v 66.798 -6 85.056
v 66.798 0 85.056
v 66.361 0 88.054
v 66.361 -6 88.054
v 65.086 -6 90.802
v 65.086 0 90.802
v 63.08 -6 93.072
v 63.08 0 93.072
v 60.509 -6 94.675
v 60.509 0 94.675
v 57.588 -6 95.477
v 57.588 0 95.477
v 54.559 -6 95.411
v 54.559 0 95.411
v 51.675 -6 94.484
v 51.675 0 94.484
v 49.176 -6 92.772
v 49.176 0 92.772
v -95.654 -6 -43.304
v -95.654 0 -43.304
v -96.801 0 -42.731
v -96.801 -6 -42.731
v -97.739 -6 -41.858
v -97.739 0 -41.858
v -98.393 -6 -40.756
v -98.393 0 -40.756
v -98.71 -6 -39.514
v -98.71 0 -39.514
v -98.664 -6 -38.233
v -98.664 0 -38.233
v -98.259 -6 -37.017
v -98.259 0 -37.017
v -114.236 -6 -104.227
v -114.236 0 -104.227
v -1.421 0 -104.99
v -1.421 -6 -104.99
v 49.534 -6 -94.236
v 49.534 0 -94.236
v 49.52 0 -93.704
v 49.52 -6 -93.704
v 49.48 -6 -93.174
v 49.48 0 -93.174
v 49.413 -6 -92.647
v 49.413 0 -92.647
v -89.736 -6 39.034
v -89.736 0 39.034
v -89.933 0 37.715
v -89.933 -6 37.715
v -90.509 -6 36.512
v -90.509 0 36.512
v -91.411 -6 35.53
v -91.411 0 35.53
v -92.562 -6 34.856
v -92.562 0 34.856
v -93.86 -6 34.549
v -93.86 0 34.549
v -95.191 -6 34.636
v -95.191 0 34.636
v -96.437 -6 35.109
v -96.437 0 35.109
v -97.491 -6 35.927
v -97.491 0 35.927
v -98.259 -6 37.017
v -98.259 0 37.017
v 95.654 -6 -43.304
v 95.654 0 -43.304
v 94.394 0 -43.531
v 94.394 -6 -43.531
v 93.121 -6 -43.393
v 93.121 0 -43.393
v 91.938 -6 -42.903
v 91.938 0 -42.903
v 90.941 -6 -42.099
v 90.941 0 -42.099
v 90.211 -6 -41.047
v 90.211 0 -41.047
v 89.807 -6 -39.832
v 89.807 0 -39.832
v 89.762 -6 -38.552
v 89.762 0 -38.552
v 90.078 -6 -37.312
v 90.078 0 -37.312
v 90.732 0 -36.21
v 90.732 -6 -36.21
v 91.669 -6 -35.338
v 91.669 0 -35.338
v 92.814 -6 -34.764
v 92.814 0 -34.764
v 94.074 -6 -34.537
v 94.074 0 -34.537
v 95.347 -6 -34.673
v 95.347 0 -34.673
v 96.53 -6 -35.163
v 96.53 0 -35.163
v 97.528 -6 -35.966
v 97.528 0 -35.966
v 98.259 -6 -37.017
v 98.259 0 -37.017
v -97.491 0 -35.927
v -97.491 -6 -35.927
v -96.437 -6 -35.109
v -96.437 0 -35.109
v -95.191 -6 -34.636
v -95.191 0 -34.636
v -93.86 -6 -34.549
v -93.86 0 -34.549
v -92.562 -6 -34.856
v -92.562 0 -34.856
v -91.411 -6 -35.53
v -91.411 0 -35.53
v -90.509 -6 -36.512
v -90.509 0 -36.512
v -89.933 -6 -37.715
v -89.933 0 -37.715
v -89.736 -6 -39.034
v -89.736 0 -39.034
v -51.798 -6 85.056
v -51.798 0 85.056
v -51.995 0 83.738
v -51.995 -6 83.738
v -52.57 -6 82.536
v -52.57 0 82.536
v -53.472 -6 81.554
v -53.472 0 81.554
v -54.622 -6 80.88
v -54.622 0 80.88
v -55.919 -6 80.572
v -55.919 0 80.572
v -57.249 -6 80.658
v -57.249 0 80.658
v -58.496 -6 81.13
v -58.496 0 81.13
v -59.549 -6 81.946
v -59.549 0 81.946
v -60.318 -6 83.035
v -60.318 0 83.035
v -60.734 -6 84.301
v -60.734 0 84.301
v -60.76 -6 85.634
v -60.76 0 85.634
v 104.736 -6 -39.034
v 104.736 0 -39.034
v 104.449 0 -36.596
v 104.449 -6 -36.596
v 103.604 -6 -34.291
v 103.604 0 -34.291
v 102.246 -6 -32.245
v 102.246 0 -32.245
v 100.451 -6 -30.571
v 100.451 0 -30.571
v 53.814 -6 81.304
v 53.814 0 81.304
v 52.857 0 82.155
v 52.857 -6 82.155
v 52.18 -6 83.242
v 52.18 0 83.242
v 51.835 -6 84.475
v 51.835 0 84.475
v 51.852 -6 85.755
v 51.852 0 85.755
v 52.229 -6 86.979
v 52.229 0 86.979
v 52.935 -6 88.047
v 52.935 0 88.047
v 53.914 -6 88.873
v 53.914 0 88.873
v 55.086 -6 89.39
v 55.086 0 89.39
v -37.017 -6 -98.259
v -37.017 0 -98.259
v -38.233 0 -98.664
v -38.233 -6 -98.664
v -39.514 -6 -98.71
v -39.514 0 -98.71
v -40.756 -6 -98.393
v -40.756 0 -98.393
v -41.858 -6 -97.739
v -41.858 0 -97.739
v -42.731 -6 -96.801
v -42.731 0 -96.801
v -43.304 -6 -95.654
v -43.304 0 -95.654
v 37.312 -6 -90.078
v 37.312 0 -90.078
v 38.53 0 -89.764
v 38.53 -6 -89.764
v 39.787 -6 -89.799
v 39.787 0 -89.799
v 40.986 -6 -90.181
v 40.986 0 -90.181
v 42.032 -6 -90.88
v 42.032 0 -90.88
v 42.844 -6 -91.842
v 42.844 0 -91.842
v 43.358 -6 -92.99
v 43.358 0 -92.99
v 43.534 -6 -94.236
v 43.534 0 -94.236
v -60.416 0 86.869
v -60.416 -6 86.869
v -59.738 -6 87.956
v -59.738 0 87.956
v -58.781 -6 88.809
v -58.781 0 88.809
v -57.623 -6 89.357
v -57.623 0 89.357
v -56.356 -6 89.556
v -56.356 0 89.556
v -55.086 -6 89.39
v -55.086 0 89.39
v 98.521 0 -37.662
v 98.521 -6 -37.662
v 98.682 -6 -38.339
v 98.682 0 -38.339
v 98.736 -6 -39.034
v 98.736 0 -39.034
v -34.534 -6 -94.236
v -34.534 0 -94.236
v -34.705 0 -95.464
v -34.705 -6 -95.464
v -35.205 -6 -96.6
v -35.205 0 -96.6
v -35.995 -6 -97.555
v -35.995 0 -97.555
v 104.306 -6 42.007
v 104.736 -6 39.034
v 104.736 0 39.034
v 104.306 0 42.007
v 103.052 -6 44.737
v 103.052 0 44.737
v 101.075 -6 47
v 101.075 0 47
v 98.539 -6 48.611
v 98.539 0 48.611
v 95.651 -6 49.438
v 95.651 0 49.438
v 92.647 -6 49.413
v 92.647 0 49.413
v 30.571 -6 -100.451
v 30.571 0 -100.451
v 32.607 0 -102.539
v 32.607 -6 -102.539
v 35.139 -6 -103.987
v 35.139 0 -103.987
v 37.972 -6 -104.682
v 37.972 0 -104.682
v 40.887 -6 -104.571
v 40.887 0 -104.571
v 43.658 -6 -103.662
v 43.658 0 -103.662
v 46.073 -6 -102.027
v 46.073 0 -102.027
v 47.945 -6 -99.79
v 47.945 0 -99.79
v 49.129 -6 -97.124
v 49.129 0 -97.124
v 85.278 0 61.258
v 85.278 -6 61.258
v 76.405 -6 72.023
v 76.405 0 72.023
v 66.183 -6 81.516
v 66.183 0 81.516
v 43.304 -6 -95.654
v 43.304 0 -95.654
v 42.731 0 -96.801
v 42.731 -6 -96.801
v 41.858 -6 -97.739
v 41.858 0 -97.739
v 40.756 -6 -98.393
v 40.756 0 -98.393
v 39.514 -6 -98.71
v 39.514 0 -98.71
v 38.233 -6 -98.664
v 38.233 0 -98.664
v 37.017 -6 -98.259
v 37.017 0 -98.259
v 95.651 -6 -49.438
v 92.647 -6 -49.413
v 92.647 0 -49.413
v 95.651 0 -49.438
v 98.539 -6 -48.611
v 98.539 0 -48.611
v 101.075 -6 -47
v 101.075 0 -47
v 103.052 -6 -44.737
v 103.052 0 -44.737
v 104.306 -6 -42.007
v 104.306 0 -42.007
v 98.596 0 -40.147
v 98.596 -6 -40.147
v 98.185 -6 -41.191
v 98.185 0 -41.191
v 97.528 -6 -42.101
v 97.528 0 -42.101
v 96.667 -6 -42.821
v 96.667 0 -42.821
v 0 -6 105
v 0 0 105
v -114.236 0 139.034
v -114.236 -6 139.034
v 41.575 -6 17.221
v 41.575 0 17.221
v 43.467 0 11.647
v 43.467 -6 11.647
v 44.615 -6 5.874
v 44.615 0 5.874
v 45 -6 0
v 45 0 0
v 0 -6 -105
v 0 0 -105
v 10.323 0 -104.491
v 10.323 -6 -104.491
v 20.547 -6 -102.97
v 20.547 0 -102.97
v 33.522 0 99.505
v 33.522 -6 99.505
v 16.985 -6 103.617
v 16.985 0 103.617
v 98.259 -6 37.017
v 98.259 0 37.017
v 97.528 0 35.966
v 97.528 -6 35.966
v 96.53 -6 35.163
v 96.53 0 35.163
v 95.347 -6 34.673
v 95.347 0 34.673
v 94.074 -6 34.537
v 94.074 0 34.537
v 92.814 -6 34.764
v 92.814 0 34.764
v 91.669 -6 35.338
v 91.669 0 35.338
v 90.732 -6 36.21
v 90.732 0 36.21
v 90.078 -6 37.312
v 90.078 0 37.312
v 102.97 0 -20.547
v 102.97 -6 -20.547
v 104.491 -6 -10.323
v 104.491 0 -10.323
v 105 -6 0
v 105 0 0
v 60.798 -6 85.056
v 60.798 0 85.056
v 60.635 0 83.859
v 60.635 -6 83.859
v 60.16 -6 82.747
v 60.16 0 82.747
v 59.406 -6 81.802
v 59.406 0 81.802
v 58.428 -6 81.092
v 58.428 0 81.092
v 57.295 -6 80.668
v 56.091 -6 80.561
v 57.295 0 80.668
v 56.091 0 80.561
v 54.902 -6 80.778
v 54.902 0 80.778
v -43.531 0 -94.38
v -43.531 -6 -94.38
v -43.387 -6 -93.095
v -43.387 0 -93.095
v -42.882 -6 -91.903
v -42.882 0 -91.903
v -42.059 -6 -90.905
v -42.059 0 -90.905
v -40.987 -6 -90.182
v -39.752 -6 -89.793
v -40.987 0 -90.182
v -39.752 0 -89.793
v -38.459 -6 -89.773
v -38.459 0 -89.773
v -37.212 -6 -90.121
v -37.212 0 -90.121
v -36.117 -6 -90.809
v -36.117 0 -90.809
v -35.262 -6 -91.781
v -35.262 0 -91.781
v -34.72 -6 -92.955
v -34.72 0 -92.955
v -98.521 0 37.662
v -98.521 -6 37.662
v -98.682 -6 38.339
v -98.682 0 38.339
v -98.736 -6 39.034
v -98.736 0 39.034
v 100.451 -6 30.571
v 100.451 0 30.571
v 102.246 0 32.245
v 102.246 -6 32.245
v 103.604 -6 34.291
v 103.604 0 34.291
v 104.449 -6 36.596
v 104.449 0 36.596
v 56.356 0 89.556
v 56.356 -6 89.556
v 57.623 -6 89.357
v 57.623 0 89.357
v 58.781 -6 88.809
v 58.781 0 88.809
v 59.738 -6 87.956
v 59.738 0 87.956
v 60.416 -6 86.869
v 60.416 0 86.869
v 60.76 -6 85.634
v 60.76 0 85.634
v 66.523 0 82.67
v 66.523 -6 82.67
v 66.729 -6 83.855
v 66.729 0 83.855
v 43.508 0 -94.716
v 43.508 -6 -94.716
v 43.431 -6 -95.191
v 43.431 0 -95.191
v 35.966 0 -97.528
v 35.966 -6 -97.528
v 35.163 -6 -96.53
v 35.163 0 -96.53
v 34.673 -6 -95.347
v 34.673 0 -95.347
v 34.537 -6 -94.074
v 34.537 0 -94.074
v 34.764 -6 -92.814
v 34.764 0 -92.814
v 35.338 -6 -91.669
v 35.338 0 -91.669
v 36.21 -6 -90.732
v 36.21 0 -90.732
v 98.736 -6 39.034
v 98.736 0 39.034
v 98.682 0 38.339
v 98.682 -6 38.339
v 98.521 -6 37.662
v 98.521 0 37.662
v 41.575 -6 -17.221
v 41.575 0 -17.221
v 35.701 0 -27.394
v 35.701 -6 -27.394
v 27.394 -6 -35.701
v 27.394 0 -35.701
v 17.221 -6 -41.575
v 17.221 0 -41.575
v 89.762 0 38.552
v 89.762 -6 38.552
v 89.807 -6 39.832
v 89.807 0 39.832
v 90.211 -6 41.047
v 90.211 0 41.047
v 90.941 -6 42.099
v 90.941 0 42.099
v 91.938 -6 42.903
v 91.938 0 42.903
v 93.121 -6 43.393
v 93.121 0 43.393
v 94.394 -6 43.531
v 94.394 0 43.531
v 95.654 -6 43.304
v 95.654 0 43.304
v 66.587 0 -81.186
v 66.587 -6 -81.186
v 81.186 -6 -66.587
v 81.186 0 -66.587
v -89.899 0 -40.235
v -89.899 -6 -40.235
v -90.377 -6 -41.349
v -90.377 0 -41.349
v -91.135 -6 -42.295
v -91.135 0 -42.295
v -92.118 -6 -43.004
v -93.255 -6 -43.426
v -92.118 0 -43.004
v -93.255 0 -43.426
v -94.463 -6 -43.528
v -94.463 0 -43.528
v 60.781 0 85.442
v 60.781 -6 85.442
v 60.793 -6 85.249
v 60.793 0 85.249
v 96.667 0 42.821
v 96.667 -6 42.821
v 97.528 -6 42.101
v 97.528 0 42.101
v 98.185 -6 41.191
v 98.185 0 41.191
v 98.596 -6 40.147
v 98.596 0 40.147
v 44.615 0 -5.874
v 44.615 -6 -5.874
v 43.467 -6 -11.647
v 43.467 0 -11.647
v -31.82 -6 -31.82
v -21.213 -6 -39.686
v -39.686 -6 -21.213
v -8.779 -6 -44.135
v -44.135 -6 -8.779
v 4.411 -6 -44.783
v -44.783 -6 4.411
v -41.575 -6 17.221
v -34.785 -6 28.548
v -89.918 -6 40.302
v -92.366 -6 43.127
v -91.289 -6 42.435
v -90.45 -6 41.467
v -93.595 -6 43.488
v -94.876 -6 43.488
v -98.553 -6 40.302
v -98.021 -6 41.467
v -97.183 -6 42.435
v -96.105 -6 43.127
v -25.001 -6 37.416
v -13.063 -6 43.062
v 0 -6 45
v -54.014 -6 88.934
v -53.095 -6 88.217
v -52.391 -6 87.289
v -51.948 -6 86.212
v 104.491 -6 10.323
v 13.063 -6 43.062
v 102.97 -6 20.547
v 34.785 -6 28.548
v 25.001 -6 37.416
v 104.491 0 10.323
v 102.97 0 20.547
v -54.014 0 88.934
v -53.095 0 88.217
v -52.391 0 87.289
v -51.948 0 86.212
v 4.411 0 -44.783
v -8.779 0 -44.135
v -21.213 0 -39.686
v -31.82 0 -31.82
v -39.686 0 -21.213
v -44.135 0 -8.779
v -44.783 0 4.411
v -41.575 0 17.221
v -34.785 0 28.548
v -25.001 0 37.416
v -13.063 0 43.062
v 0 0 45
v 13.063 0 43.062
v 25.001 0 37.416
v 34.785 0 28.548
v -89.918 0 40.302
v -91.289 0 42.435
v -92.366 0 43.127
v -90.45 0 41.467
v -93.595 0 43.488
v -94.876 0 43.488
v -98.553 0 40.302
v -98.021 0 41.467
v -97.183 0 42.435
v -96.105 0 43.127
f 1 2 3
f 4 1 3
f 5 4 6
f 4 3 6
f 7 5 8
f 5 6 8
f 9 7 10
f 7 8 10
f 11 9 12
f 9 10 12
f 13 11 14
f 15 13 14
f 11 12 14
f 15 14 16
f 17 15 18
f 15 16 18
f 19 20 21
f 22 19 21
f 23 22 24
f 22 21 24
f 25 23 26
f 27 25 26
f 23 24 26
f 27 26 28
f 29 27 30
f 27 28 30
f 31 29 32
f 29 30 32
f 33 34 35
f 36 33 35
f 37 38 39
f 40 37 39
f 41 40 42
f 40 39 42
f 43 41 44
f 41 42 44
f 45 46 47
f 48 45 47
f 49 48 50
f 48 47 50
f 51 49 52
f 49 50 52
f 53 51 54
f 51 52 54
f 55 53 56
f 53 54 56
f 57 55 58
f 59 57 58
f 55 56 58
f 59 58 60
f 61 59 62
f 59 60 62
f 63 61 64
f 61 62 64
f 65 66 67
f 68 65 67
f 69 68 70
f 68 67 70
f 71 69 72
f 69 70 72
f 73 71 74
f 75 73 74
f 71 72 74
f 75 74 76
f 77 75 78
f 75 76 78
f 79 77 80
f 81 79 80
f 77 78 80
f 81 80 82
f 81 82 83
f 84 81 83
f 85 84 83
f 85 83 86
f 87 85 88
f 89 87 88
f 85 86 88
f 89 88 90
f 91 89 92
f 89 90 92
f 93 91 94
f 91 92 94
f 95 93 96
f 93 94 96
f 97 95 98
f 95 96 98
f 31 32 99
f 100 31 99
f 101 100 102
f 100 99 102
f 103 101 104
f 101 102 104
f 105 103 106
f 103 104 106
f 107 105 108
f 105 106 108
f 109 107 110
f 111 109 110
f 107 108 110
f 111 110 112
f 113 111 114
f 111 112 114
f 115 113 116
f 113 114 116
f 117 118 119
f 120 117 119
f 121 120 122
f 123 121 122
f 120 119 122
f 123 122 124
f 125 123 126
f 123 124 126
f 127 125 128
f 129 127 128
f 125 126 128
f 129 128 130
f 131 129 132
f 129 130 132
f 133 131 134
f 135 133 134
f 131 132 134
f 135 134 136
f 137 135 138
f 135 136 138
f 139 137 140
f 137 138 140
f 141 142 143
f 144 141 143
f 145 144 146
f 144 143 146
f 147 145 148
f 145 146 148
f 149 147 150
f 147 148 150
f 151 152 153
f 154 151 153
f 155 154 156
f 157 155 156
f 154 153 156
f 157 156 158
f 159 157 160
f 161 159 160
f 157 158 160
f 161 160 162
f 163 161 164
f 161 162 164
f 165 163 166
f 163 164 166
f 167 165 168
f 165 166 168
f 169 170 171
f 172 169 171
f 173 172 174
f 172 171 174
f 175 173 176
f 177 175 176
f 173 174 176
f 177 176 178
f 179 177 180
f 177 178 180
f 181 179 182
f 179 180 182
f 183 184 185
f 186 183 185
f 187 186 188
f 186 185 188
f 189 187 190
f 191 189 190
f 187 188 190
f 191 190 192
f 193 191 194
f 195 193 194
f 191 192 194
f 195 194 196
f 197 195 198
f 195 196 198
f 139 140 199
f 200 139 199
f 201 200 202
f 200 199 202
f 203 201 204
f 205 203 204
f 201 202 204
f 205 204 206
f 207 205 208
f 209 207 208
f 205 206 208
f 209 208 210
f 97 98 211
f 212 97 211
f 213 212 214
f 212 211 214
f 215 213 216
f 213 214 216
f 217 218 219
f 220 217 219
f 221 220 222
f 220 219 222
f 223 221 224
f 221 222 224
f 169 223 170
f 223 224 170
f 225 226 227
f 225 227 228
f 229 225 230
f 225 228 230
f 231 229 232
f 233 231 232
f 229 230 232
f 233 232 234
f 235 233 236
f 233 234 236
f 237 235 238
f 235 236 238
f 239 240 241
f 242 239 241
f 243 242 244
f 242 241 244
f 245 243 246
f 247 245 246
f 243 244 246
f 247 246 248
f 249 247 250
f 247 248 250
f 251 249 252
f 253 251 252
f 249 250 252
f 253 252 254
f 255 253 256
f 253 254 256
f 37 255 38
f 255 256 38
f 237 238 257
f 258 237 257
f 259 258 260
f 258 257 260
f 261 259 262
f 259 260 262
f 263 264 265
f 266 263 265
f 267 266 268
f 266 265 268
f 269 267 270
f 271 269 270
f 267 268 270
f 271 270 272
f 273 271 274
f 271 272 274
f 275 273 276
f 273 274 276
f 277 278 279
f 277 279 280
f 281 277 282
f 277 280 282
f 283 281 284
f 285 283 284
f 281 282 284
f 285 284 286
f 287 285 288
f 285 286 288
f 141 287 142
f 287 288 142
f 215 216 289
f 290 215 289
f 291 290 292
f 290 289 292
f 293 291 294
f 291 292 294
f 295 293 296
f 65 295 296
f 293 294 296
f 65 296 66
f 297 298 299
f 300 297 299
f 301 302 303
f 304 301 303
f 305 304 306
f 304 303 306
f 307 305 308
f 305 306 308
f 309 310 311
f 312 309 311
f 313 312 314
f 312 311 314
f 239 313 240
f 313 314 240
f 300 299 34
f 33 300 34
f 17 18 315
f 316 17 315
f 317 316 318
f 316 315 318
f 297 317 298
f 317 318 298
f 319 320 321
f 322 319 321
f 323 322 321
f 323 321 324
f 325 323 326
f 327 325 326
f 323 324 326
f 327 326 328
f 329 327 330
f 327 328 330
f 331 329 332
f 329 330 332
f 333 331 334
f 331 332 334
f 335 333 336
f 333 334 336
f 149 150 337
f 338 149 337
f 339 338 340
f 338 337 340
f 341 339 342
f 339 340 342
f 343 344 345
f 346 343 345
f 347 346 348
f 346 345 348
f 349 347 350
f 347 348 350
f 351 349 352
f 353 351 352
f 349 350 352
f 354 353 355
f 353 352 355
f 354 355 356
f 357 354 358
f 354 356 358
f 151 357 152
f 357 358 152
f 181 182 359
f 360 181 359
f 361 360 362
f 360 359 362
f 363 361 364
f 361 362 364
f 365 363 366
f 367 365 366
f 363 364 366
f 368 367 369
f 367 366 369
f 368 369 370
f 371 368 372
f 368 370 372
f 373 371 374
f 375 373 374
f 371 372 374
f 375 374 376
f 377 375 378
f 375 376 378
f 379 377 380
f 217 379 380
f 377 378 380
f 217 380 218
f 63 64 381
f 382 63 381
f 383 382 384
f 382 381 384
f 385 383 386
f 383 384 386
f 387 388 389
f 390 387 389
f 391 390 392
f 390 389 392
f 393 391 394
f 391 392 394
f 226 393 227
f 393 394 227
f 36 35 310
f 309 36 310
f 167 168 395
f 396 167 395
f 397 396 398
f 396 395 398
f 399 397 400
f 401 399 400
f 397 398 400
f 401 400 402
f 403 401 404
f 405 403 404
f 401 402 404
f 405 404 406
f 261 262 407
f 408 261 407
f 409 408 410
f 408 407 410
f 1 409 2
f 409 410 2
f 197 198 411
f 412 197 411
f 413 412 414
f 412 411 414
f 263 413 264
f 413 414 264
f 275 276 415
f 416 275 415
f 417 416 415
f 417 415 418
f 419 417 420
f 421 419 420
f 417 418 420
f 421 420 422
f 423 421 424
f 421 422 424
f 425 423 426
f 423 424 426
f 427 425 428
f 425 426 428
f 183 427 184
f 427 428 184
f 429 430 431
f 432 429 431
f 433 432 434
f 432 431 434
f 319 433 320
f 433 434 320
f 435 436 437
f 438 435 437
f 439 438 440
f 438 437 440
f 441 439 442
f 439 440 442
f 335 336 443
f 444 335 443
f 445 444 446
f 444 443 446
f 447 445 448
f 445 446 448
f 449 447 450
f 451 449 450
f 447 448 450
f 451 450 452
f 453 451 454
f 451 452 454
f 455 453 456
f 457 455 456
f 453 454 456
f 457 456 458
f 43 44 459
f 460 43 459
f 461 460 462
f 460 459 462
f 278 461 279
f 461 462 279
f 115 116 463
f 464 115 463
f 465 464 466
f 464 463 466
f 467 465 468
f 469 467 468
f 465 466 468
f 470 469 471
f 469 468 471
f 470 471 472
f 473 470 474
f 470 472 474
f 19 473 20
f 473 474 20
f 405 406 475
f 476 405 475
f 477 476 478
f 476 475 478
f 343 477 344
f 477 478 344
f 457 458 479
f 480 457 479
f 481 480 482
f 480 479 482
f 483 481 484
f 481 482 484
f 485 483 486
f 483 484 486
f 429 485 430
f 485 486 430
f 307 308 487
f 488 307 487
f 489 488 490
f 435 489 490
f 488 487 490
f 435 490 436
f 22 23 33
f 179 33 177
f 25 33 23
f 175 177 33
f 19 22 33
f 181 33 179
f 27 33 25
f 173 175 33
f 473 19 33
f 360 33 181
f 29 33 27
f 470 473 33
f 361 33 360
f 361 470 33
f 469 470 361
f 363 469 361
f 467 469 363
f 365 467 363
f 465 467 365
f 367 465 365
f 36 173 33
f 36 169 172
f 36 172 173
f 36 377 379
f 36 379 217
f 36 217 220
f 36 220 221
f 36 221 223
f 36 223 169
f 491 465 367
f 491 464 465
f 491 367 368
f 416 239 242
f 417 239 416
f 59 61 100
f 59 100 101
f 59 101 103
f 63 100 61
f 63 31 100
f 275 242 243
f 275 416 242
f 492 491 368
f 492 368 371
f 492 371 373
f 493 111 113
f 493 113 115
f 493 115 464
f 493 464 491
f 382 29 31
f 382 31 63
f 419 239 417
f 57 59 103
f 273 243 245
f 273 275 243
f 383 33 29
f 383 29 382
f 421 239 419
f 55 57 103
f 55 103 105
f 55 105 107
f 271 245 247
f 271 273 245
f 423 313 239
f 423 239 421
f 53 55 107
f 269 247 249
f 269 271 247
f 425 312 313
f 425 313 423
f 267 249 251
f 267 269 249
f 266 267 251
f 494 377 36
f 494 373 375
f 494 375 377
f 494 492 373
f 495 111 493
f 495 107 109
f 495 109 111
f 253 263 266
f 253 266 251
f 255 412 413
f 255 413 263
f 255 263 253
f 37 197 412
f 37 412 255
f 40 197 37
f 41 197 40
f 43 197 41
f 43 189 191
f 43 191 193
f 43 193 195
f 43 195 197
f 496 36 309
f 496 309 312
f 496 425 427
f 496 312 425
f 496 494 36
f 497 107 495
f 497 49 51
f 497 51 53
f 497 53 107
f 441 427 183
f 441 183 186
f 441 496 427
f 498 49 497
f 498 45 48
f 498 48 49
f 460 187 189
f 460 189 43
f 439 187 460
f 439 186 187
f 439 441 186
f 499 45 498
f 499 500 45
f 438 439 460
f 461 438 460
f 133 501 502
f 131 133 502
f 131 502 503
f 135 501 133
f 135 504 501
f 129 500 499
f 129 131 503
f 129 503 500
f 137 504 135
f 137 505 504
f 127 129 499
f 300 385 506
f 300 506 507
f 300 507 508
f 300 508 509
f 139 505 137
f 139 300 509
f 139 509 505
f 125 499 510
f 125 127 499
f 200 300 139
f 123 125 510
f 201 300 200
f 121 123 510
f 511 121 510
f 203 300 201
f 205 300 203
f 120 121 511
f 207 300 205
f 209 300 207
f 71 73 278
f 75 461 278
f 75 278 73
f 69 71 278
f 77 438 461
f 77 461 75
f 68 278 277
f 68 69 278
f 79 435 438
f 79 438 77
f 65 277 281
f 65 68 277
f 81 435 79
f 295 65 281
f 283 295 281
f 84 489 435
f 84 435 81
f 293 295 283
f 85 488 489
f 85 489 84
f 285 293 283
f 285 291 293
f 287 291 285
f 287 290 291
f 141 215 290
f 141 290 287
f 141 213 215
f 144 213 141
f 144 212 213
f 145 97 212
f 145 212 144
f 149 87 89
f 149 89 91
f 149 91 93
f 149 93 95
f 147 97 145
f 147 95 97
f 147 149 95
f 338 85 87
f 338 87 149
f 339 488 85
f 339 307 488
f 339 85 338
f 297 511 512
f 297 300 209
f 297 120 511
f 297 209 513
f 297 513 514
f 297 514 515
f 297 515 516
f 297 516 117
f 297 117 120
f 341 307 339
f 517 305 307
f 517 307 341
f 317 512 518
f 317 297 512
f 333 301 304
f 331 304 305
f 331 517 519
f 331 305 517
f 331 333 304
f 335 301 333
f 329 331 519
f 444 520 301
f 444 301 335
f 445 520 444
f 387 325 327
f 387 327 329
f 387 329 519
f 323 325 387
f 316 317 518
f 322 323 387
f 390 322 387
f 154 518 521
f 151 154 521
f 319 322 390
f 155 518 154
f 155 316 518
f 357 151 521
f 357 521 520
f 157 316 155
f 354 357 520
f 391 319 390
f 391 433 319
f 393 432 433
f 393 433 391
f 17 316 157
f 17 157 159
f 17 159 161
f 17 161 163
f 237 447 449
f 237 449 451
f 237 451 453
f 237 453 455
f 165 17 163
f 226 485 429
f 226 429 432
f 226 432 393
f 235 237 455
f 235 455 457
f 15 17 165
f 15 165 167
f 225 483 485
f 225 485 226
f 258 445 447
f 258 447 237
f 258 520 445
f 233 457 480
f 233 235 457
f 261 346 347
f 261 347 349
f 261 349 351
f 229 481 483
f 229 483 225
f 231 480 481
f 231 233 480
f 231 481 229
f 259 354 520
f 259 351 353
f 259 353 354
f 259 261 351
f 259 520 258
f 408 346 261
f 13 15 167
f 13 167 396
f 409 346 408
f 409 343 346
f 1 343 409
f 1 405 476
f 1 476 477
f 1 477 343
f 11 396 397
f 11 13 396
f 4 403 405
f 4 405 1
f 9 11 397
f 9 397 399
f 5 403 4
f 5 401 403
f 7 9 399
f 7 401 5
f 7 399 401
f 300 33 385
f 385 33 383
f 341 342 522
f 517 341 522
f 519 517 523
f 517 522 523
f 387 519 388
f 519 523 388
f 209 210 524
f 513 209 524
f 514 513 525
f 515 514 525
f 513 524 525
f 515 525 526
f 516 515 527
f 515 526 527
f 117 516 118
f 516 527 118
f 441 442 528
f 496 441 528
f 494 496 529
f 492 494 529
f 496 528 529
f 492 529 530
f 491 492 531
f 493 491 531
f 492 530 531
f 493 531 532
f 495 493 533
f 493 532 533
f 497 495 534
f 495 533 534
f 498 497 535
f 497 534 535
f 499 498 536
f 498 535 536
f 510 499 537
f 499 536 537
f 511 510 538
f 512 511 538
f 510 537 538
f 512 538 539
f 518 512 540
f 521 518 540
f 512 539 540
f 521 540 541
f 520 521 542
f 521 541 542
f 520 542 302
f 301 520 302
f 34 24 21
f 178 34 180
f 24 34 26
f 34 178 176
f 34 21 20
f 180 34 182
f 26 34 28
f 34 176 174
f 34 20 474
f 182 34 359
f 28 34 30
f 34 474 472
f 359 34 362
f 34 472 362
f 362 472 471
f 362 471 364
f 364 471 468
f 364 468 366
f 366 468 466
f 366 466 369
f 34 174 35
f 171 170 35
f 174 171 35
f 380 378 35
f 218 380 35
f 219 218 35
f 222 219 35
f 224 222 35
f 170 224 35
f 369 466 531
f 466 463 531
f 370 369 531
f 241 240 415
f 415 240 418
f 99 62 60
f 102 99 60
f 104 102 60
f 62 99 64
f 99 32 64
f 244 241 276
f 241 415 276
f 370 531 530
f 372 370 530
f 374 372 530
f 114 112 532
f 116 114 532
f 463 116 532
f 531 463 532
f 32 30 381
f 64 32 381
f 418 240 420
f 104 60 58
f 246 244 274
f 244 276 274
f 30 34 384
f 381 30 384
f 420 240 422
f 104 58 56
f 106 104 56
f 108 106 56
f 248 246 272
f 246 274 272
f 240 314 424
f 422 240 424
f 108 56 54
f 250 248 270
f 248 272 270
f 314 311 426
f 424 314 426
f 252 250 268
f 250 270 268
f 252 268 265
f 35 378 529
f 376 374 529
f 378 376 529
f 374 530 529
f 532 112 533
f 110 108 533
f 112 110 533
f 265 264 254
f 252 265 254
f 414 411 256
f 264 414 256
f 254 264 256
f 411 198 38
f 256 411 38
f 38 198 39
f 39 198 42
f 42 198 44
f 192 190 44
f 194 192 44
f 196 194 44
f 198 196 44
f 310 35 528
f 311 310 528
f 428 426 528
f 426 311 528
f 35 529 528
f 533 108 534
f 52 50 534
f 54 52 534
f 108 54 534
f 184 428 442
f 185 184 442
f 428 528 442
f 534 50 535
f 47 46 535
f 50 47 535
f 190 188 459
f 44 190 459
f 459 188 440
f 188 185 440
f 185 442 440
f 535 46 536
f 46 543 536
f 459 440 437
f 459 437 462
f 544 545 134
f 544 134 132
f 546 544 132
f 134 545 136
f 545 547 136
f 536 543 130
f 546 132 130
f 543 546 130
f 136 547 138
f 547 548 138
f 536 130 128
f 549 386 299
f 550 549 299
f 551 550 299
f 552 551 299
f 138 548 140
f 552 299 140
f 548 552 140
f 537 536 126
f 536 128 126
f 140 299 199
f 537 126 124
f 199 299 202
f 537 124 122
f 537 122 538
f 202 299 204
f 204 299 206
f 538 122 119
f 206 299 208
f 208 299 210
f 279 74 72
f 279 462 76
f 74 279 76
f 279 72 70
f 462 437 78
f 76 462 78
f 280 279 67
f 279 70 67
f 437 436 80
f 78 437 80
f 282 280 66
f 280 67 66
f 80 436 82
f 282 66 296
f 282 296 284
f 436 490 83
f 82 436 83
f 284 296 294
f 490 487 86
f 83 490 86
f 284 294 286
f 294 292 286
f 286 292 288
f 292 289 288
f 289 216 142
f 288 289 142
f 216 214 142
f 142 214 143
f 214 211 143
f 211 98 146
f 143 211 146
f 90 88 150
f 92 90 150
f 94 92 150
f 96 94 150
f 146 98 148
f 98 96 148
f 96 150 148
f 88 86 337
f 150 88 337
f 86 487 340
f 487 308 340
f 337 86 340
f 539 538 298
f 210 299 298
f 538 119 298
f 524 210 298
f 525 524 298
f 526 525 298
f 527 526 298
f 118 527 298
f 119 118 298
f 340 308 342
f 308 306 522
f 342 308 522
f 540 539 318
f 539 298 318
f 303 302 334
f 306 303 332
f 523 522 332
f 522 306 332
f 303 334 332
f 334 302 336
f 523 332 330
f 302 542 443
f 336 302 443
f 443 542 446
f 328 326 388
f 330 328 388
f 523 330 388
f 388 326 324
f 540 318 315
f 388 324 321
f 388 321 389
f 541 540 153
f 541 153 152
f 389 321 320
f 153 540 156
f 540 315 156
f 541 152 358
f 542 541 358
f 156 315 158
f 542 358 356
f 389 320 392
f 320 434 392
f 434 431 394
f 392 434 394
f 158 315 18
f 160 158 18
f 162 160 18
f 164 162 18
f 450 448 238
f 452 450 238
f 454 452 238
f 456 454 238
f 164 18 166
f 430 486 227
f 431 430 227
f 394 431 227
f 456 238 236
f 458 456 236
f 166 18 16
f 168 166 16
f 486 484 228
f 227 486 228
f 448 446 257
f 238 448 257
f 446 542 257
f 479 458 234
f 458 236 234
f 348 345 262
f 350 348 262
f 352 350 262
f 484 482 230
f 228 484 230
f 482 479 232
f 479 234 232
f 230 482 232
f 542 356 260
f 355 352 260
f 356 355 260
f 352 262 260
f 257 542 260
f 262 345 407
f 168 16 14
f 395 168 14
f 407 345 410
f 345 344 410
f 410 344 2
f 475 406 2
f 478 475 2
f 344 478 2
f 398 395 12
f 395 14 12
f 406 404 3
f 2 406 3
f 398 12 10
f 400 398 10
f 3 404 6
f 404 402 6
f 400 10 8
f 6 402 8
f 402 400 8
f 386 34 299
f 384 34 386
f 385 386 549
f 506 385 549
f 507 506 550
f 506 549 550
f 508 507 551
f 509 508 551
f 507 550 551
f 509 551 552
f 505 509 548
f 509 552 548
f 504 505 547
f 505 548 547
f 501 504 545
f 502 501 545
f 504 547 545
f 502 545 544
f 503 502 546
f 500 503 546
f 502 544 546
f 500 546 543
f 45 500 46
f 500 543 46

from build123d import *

# Parameters (mm, degrees)
F1_DEPTH = 6


with BuildPart() as f1:
    # F0 (on Front) → F1 (new body)
    with BuildSketch(Plane.XZ):
        with BuildLine():
            ThreePointArc((100.4510831721, -30.5708993907), (103.8565446495, -15.4537417302), (105, 0))
            ThreePointArc((105, 0), (103.8565446495, 15.4537417302), (100.4510831721, 30.5708993907))
            ThreePointArc((100.4510831721, 30.5708993907), (91.4115955865, 28.9206312082), (84.5349772248, 35.0155340614))
            Line((84.5349772248, 35.0155340614), (41.574578963, 17.2207544564))
            ThreePointArc((41.574578963, 17.2207544564), (44.1353376181, 8.7790644907), (45, 0))
            ThreePointArc((45, 0), (44.1353376181, -8.7790644907), (41.574578963, -17.2207544564))
            Line((41.574578963, -17.2207544564), (84.5349772248, -35.0155340614))
            ThreePointArc((84.5349772248, -35.0155340614), (91.4115955865, -28.9206312082), (100.4510831721, -30.5708993907))
        make_face()
        with BuildLine():
            ThreePointArc((84.5349772248, 35.0155340614), (91.4115955865, 28.9206312082), (100.4510831721, 30.5708993907))
            ThreePointArc((100.4510831721, 30.5708993907), (99.407070598, 33.8117481819), (98.2585290039, 37.0170430746))
            ThreePointArc((98.2585290039, 37.0170430746), (94.0737613555, 34.5366252803), (90.0782544199, 37.3116346556))
            Line((90.0782544199, 37.3116346556), (84.5349772248, 35.0155340614))
        make_face()
        with BuildLine():
            ThreePointArc((98.2585290039, 37.0170430746), (99.407070598, 33.8117481819), (100.4510831721, 30.5708993907))
            ThreePointArc((100.4510831721, 30.5708993907), (103.6035133918, 34.2908941649), (104.7357123162, 39.0337101012))
            ThreePointArc((104.7357123162, 39.0337101012), (101.075434913, 47.0004029407), (92.6465323546, 49.4127518224))
            ThreePointArc((92.6465323546, 49.4127518224), (94.199930141, 46.3828972946), (95.6542743456, 43.3042699906))
            ThreePointArc((95.6542743456, 43.3042699906), (97.8849265557, 41.6668138656), (98.7357123162, 39.0337101012))
            ThreePointArc((98.7357123162, 39.0337101012), (98.6147918481, 37.997533257), (98.2585290039, 37.0170430746))
        make_face()
        with BuildLine():
            ThreePointArc((104.7357123162, -39.0337101012), (103.6035133918, -34.2908941649), (100.4510831721, -30.5708993907))
            ThreePointArc((100.4510831721, -30.5708993907), (99.407070598, -33.8117481819), (98.2585290039, -37.0170430746))
            ThreePointArc((98.2585290039, -37.0170430746), (98.6147918481, -37.997533257), (98.7357123162, -39.0337101012))
            ThreePointArc((98.7357123162, -39.0337101012), (97.8849265557, -41.6668138656), (95.6542743456, -43.3042699906))
            ThreePointArc((95.6542743456, -43.3042699906), (94.199930141, -46.3828972946), (92.6465323546, -49.4127518224))
            ThreePointArc((92.6465323546, -49.4127518224), (101.075434913, -47.0004029407), (104.7357123162, -39.0337101012))
        make_face()
        with BuildLine():
            ThreePointArc((98.2585290039, -37.0170430746), (99.407070598, -33.8117481819), (100.4510831721, -30.5708993907))
            ThreePointArc((100.4510831721, -30.5708993907), (91.4115955865, -28.9206312082), (84.5349772248, -35.0155340614))
            Line((84.5349772248, -35.0155340614), (90.0782544199, -37.3116346556))
            ThreePointArc((90.0782544199, -37.3116346556), (94.0737613555, -34.5366252803), (98.2585290039, -37.0170430746))
        make_face()
        with BuildLine():
            ThreePointArc((92.6465323546, 49.4127518224), (85.0877335618, 44.1877846748), (84.5349772248, 35.0155340614))
            Line((84.5349772248, 35.0155340614), (90.0782544199, 37.3116346556))
            ThreePointArc((90.0782544199, 37.3116346556), (90.9412765212, 42.0991126512), (95.6542743456, 43.3042699906))
            ThreePointArc((95.6542743456, 43.3042699906), (94.199930141, 46.3828972946), (92.6465323546, 49.4127518224))
        make_face()
        with BuildLine():
            Line((41.574578963, 17.2207544564), (84.5349772248, 35.0155340614))
            ThreePointArc((84.5349772248, 35.0155340614), (85.0877335618, 44.1877846748), (92.6465323546, 49.4127518224))
            ThreePointArc((92.6465323546, 49.4127518224), (81.0205812557, 66.7882131292), (66.1826921615, 81.5159570774))
            ThreePointArc((66.1826921615, 81.5159570774), (59.6114355729, 75.0930054405), (50.5022341561, 76.3005527191))
            Line((50.5022341561, 76.3005527191), (24.837164339, 37.524861993))
            ThreePointArc((24.837164339, 37.524861993), (34.7231062524, 28.6235199125), (41.574578963, 17.2207544564))
        make_face()
        with BuildLine():
            ThreePointArc((92.6465323546, -49.4127518224), (85.0877335618, -44.1877846748), (84.5349772248, -35.0155340614))
            Line((84.5349772248, -35.0155340614), (41.574578963, -17.2207544564))
            ThreePointArc((41.574578963, -17.2207544564), (31.8198051534, -31.8198051534), (17.2207544564, -41.574578963))
            Line((17.2207544564, -41.574578963), (35.0155340614, -84.5349772248))
            ThreePointArc((35.0155340614, -84.5349772248), (44.1877846748, -85.0877335618), (49.4127518224, -92.6465323546))
            ThreePointArc((49.4127518224, -92.6465323546), (74.2462120246, -74.2462120246), (92.6465323546, -49.4127518224))
        make_face()
        with BuildLine():
            Line((90.0782544199, -37.3116346556), (84.5349772248, -35.0155340614))
            ThreePointArc((84.5349772248, -35.0155340614), (85.0877335618, -44.1877846748), (92.6465323546, -49.4127518224))
            ThreePointArc((92.6465323546, -49.4127518224), (94.199930141, -46.3828972946), (95.6542743456, -43.3042699906))
            ThreePointArc((95.6542743456, -43.3042699906), (90.9412765212, -42.0991126512), (90.0782544199, -37.3116346556))
        make_face()
        with BuildLine():
            ThreePointArc((17.2207544564, -41.574578963), (-44.7928289265, 4.3130588634), (24.837164339, 37.524861993))
            Line((24.837164339, 37.524861993), (50.5022341561, 76.3005527191))
            ThreePointArc((50.5022341561, 76.3005527191), (45.831432476, 84.2137905236), (49.1761961289, 92.772311248))
            ThreePointArc((49.1761961289, 92.772311248), (25.3368044449, 101.8972342143), (0, 105))
            ThreePointArc((0, 105), (-25.3368044449, 101.8972342143), (-49.1761961289, 92.772311248))
            ThreePointArc((-49.1761961289, 92.772311248), (-46.6792448947, 89.2679775332), (-45.7975725018, 85.0563538509))
            ThreePointArc((-45.7975725018, 85.0563538509), (-54.5008750352, 74.7112159488), (-66.1826921615, 81.5159570774))
            ThreePointArc((-66.1826921615, 81.5159570774), (-81.0205812557, 66.7882131292), (-92.6465323546, 49.4127518224))
            ThreePointArc((-92.6465323546, 49.4127518224), (-86.2690194767, 45.8734326981), (-83.7357123162, 39.0337101012))
            ThreePointArc((-83.7357123162, 39.0337101012), (-89.4928963798, 29.6659090256), (-100.4510831721, 30.5708993907))
            ThreePointArc((-100.4510831721, 30.5708993907), (-105, 0), (-100.4510831721, -30.5708993907))
            ThreePointArc((-100.4510831721, -30.5708993907), (-89.4928963798, -29.6659090255), (-83.7357123162, -39.0337101012))
            ThreePointArc((-83.7357123162, -39.0337101012), (-86.2690194767, -45.8734326981), (-92.6465323546, -49.4127518224))
            ThreePointArc((-92.6465323546, -49.4127518224), (-74.2462120246, -74.2462120246), (-49.4127518224, -92.6465323546))
            ThreePointArc((-49.4127518224, -92.6465323546), (-38.2368218005, -83.7659955561), (-28.5337101012, -94.2357123162))
            ThreePointArc((-28.5337101012, -94.2357123162), (-29.0559971253, -97.506070671), (-30.5708993907, -100.4510831721))
            ThreePointArc((-30.5708993907, -100.4510831721), (-16.1559201029, -103.7496325084), (-1.4205010638, -104.9903908781))
            Line((-1.4205010638, -104.9903908781), (0, -105))
            ThreePointArc((0, -105), (15.4537417302, -103.8565446495), (30.5708993907, -100.4510831721))
            ThreePointArc((30.5708993907, -100.4510831721), (28.9206312082, -91.4115955865), (35.0155340614, -84.5349772248))
            Line((35.0155340614, -84.5349772248), (17.2207544564, -41.574578963))
        make_face()
        with BuildLine():
            ThreePointArc((50.5022341561, 76.3005527191), (59.6114355729, 75.0930054405), (66.1826921615, 81.5159570774))
            ThreePointArc((66.1826921615, 81.5159570774), (63.5049068662, 83.6189380698), (60.7603445735, 85.6339916582))
            ThreePointArc((60.7603445735, 85.6339916582), (60.7882558754, 85.3457719546), (60.7975725018, 85.0563538509))
            ThreePointArc((60.7975725018, 85.0563538509), (58.4275110042, 81.0923455289), (53.8138560679, 81.3038676515))
            Line((53.8138560679, 81.3038676515), (50.5022341561, 76.3005527191))
        make_face()
        with BuildLine():
            ThreePointArc((60.7603445735, 85.6339916582), (63.5049068662, 83.6189380698), (66.1826921615, 81.5159570774))
            ThreePointArc((66.1826921615, 81.5159570774), (66.6427104039, 83.2596563842), (66.7975725018, 85.0563538509))
            ThreePointArc((66.7975725018, 85.0563538509), (60.5091961842, 94.674681458), (49.1761961289, 92.772311248))
            ThreePointArc((49.1761961289, 92.772311248), (52.1582944094, 91.1290970234), (55.0855469393, 89.390058275))
            ThreePointArc((55.0855469393, 89.390058275), (58.7812889357, 88.8088400502), (60.7603445735, 85.6339916582))
        make_face()
        with BuildLine():
            ThreePointArc((49.5337101012, -94.2357123162), (49.5034268613, -93.4388240154), (49.4127518224, -92.6465323546))
            ThreePointArc((49.4127518224, -92.6465323546), (46.3828972946, -94.199930141), (43.3042699906, -95.6542743456))
            ThreePointArc((43.3042699906, -95.6542743456), (40.7557855469, -98.3931702125), (37.0170430746, -98.2585290039))
            ThreePointArc((37.0170430746, -98.2585290039), (33.8117481819, -99.407070598), (30.5708993907, -100.4510831721))
            ThreePointArc((30.5708993907, -100.4510831721), (42.3040684561, -104.2134252921), (49.5337101012, -94.2357123162))
        make_face()
        with BuildLine():
            ThreePointArc((43.3042699906, -95.6542743456), (46.3828972946, -94.199930141), (49.4127518224, -92.6465323546))
            ThreePointArc((49.4127518224, -92.6465323546), (44.1877846748, -85.0877335618), (35.0155340614, -84.5349772248))
            Line((35.0155340614, -84.5349772248), (37.3116346556, -90.0782544199))
            ThreePointArc((37.3116346556, -90.0782544199), (41.5337761498, -90.4940990608), (43.5337101012, -94.2357123162))
            ThreePointArc((43.5337101012, -94.2357123162), (43.4759797634, -94.9542109236), (43.3042699906, -95.6542743456))
        make_face()
        with BuildLine():
            ThreePointArc((49.1761961289, 92.772311248), (45.831432476, 84.2137905236), (50.5022341561, 76.3005527191))
            Line((50.5022341561, 76.3005527191), (53.8138560679, 81.3038676515))
            ThreePointArc((53.8138560679, 81.3038676515), (51.8522100953, 85.7554626223), (55.0855469393, 89.390058275))
            ThreePointArc((55.0855469393, 89.390058275), (52.1582944094, 91.1290970234), (49.1761961289, 92.772311248))
        make_face()
        with BuildLine():
            Line((37.3116346556, -90.0782544199), (35.0155340614, -84.5349772248))
            ThreePointArc((35.0155340614, -84.5349772248), (28.9206312082, -91.4115955865), (30.5708993907, -100.4510831721))
            ThreePointArc((30.5708993907, -100.4510831721), (33.8117481819, -99.407070598), (37.0170430746, -98.2585290039))
            ThreePointArc((37.0170430746, -98.2585290039), (34.5366252803, -94.0737613555), (37.3116346556, -90.0782544199))
        make_face()
        with BuildLine():
            ThreePointArc((-49.1761961289, 92.772311248), (-25.3368044449, 101.8972342143), (0, 105))
            Line((0, 105), (-114.2357123162, 139.0337101012))
            Line((-114.2357123162, 139.0337101012), (-114.2357123162, 39.0337101012))
            Line((-114.2357123162, 39.0337101012), (-104.7357123162, 39.0337101012))
            ThreePointArc((-104.7357123162, 39.0337101012), (-101.075434913, 47.0004029407), (-92.6465323546, 49.4127518224))
            ThreePointArc((-92.6465323546, 49.4127518224), (-81.0205812557, 66.7882131292), (-66.1826921615, 81.5159570774))
            ThreePointArc((-66.1826921615, 81.5159570774), (-62.0929108476, 93.8121549826), (-49.1761961289, 92.772311248))
        make_face()
        with BuildLine():
            ThreePointArc((-45.7975725018, 85.0563538509), (-46.6792448947, 89.2679775332), (-49.1761961289, 92.772311248))
            ThreePointArc((-49.1761961289, 92.772311248), (-52.1582944094, 91.1290970234), (-55.0855469393, 89.390058275))
            ThreePointArc((-55.0855469393, 89.390058275), (-52.7125958609, 87.7762697474), (-51.7975725018, 85.0563538509))
            ThreePointArc((-51.7975725018, 85.0563538509), (-56.5869906056, 80.5656704773), (-60.7603445735, 85.6339916582))
            ThreePointArc((-60.7603445735, 85.6339916582), (-63.5049068662, 83.6189380698), (-66.1826921615, 81.5159570774))
            ThreePointArc((-66.1826921615, 81.5159570774), (-54.5008750352, 74.7112159488), (-45.7975725018, 85.0563538509))
        make_face()
        with BuildLine():
            ThreePointArc((-55.0855469393, 89.390058275), (-52.1582944094, 91.1290970234), (-49.1761961289, 92.772311248))
            ThreePointArc((-49.1761961289, 92.772311248), (-62.0929108476, 93.8121549826), (-66.1826921615, 81.5159570774))
            ThreePointArc((-66.1826921615, 81.5159570774), (-63.5049068662, 83.6189380698), (-60.7603445735, 85.6339916582))
            ThreePointArc((-60.7603445735, 85.6339916582), (-58.7812889357, 88.8088400502), (-55.0855469393, 89.390058275))
        make_face()
        with BuildLine():
            Line((-39.1047365684, -104.7354720868), (-1.4205010638, -104.9903908781))
            ThreePointArc((-1.4205010638, -104.9903908781), (-16.1559201029, -103.7496325084), (-30.5708993907, -100.4510831721))
            ThreePointArc((-30.5708993907, -100.4510831721), (-34.3226053699, -103.6195011144), (-39.1047365684, -104.7354720868))
        make_face()
        with BuildLine():
            Line((-104.7357123162, 39.0337101012), (-114.2357123162, 39.0337101012))
            Line((-114.2357123162, 39.0337101012), (-114.2357123162, -104.2272410647))
            Line((-114.2357123162, -104.2272410647), (-39.1047365684, -104.7354720868))
            ThreePointArc((-39.1047365684, -104.7354720868), (-47.0234909022, -101.0484505874), (-49.4127518224, -92.6465323546))
            ThreePointArc((-49.4127518224, -92.6465323546), (-74.2462120246, -74.2462120246), (-92.6465323546, -49.4127518224))
            ThreePointArc((-92.6465323546, -49.4127518224), (-103.9364474075, -43.0518861411), (-100.4510831721, -30.5708993907))
            ThreePointArc((-100.4510831721, -30.5708993907), (-105, 0), (-100.4510831721, 30.5708993907))
            ThreePointArc((-100.4510831721, 30.5708993907), (-103.6035133918, 34.2908941649), (-104.7357123162, 39.0337101012))
        make_face()
        with BuildLine():
            ThreePointArc((-39.1047365684, -104.7354720868), (-34.3226053699, -103.6195011144), (-30.5708993907, -100.4510831721))
            ThreePointArc((-30.5708993907, -100.4510831721), (-33.8117481819, -99.407070598), (-37.0170430746, -98.2585290039))
            ThreePointArc((-37.0170430746, -98.2585290039), (-40.7557855469, -98.3931702125), (-43.3042699906, -95.6542743456))
            ThreePointArc((-43.3042699906, -95.6542743456), (-46.3828972946, -94.199930141), (-49.4127518224, -92.6465323546))
            ThreePointArc((-49.4127518224, -92.6465323546), (-47.0234909022, -101.0484505874), (-39.1047365684, -104.7354720868))
        make_face()
        with BuildLine():
            ThreePointArc((-37.0170430746, -98.2585290039), (-33.8117481819, -99.407070598), (-30.5708993907, -100.4510831721))
            ThreePointArc((-30.5708993907, -100.4510831721), (-29.0559971253, -97.506070671), (-28.5337101012, -94.2357123162))
            ThreePointArc((-28.5337101012, -94.2357123162), (-38.2368218005, -83.7659955561), (-49.4127518224, -92.6465323546))
            ThreePointArc((-49.4127518224, -92.6465323546), (-46.3828972946, -94.199930141), (-43.3042699906, -95.6542743456))
            ThreePointArc((-43.3042699906, -95.6542743456), (-39.7522087087, -89.793442654), (-34.5337101012, -94.2357123162))
            ThreePointArc((-34.5337101012, -94.2357123162), (-35.2045455958, -96.5995014755), (-37.0170430746, -98.2585290039))
        make_face()
        with BuildLine():
            ThreePointArc((-83.7357123162, 39.0337101012), (-86.2690194767, 45.8734326981), (-92.6465323546, 49.4127518224))
            ThreePointArc((-92.6465323546, 49.4127518224), (-94.199930141, 46.3828972946), (-95.6542743456, 43.3042699906))
            ThreePointArc((-95.6542743456, 43.3042699906), (-91.6026085518, 42.6829243408), (-89.7357123162, 39.0337101012))
            ThreePointArc((-89.7357123162, 39.0337101012), (-93.1995354719, 34.6546305692), (-98.2585290039, 37.0170430746))
            ThreePointArc((-98.2585290039, 37.0170430746), (-99.407070598, 33.8117481819), (-100.4510831721, 30.5708993907))
            ThreePointArc((-100.4510831721, 30.5708993907), (-89.4928963798, 29.6659090256), (-83.7357123162, 39.0337101012))
        make_face()
        with BuildLine():
            ThreePointArc((-95.6542743456, 43.3042699906), (-94.199930141, 46.3828972946), (-92.6465323546, 49.4127518224))
            ThreePointArc((-92.6465323546, 49.4127518224), (-101.075434913, 47.0004029407), (-104.7357123162, 39.0337101012))
            Line((-104.7357123162, 39.0337101012), (-98.7357123162, 39.0337101012))
            ThreePointArc((-98.7357123162, 39.0337101012), (-97.8849265557, 41.6668138656), (-95.6542743456, 43.3042699906))
        make_face()
        with BuildLine():
            Line((-98.7357123162, 39.0337101012), (-104.7357123162, 39.0337101012))
            ThreePointArc((-104.7357123162, 39.0337101012), (-103.6035133918, 34.2908941649), (-100.4510831721, 30.5708993907))
            ThreePointArc((-100.4510831721, 30.5708993907), (-99.407070598, 33.8117481819), (-98.2585290039, 37.0170430746))
            ThreePointArc((-98.2585290039, 37.0170430746), (-98.6147918481, 37.997533257), (-98.7357123162, 39.0337101012))
        make_face()
        with BuildLine():
            ThreePointArc((-100.4510831721, -30.5708993907), (-103.9364474075, -43.0518861411), (-92.6465323546, -49.4127518224))
            ThreePointArc((-92.6465323546, -49.4127518224), (-94.199930141, -46.3828972946), (-95.6542743456, -43.3042699906))
            ThreePointArc((-95.6542743456, -43.3042699906), (-98.3931702125, -40.7557855469), (-98.2585290039, -37.0170430746))
            ThreePointArc((-98.2585290039, -37.0170430746), (-99.407070598, -33.8117481819), (-100.4510831721, -30.5708993907))
        make_face()
        with BuildLine():
            ThreePointArc((-95.6542743456, -43.3042699906), (-94.199930141, -46.3828972946), (-92.6465323546, -49.4127518224))
            ThreePointArc((-92.6465323546, -49.4127518224), (-86.2690194767, -45.8734326981), (-83.7357123162, -39.0337101012))
            ThreePointArc((-83.7357123162, -39.0337101012), (-89.4928963798, -29.6659090255), (-100.4510831721, -30.5708993907))
            ThreePointArc((-100.4510831721, -30.5708993907), (-99.407070598, -33.8117481819), (-98.2585290039, -37.0170430746))
            ThreePointArc((-98.2585290039, -37.0170430746), (-93.1995354719, -34.6546305692), (-89.7357123162, -39.0337101012))
            ThreePointArc((-89.7357123162, -39.0337101012), (-91.6026085518, -42.6829243408), (-95.6542743456, -43.3042699906))
        make_face()
    extrude(amount=F1_DEPTH)


solid = f1.part
